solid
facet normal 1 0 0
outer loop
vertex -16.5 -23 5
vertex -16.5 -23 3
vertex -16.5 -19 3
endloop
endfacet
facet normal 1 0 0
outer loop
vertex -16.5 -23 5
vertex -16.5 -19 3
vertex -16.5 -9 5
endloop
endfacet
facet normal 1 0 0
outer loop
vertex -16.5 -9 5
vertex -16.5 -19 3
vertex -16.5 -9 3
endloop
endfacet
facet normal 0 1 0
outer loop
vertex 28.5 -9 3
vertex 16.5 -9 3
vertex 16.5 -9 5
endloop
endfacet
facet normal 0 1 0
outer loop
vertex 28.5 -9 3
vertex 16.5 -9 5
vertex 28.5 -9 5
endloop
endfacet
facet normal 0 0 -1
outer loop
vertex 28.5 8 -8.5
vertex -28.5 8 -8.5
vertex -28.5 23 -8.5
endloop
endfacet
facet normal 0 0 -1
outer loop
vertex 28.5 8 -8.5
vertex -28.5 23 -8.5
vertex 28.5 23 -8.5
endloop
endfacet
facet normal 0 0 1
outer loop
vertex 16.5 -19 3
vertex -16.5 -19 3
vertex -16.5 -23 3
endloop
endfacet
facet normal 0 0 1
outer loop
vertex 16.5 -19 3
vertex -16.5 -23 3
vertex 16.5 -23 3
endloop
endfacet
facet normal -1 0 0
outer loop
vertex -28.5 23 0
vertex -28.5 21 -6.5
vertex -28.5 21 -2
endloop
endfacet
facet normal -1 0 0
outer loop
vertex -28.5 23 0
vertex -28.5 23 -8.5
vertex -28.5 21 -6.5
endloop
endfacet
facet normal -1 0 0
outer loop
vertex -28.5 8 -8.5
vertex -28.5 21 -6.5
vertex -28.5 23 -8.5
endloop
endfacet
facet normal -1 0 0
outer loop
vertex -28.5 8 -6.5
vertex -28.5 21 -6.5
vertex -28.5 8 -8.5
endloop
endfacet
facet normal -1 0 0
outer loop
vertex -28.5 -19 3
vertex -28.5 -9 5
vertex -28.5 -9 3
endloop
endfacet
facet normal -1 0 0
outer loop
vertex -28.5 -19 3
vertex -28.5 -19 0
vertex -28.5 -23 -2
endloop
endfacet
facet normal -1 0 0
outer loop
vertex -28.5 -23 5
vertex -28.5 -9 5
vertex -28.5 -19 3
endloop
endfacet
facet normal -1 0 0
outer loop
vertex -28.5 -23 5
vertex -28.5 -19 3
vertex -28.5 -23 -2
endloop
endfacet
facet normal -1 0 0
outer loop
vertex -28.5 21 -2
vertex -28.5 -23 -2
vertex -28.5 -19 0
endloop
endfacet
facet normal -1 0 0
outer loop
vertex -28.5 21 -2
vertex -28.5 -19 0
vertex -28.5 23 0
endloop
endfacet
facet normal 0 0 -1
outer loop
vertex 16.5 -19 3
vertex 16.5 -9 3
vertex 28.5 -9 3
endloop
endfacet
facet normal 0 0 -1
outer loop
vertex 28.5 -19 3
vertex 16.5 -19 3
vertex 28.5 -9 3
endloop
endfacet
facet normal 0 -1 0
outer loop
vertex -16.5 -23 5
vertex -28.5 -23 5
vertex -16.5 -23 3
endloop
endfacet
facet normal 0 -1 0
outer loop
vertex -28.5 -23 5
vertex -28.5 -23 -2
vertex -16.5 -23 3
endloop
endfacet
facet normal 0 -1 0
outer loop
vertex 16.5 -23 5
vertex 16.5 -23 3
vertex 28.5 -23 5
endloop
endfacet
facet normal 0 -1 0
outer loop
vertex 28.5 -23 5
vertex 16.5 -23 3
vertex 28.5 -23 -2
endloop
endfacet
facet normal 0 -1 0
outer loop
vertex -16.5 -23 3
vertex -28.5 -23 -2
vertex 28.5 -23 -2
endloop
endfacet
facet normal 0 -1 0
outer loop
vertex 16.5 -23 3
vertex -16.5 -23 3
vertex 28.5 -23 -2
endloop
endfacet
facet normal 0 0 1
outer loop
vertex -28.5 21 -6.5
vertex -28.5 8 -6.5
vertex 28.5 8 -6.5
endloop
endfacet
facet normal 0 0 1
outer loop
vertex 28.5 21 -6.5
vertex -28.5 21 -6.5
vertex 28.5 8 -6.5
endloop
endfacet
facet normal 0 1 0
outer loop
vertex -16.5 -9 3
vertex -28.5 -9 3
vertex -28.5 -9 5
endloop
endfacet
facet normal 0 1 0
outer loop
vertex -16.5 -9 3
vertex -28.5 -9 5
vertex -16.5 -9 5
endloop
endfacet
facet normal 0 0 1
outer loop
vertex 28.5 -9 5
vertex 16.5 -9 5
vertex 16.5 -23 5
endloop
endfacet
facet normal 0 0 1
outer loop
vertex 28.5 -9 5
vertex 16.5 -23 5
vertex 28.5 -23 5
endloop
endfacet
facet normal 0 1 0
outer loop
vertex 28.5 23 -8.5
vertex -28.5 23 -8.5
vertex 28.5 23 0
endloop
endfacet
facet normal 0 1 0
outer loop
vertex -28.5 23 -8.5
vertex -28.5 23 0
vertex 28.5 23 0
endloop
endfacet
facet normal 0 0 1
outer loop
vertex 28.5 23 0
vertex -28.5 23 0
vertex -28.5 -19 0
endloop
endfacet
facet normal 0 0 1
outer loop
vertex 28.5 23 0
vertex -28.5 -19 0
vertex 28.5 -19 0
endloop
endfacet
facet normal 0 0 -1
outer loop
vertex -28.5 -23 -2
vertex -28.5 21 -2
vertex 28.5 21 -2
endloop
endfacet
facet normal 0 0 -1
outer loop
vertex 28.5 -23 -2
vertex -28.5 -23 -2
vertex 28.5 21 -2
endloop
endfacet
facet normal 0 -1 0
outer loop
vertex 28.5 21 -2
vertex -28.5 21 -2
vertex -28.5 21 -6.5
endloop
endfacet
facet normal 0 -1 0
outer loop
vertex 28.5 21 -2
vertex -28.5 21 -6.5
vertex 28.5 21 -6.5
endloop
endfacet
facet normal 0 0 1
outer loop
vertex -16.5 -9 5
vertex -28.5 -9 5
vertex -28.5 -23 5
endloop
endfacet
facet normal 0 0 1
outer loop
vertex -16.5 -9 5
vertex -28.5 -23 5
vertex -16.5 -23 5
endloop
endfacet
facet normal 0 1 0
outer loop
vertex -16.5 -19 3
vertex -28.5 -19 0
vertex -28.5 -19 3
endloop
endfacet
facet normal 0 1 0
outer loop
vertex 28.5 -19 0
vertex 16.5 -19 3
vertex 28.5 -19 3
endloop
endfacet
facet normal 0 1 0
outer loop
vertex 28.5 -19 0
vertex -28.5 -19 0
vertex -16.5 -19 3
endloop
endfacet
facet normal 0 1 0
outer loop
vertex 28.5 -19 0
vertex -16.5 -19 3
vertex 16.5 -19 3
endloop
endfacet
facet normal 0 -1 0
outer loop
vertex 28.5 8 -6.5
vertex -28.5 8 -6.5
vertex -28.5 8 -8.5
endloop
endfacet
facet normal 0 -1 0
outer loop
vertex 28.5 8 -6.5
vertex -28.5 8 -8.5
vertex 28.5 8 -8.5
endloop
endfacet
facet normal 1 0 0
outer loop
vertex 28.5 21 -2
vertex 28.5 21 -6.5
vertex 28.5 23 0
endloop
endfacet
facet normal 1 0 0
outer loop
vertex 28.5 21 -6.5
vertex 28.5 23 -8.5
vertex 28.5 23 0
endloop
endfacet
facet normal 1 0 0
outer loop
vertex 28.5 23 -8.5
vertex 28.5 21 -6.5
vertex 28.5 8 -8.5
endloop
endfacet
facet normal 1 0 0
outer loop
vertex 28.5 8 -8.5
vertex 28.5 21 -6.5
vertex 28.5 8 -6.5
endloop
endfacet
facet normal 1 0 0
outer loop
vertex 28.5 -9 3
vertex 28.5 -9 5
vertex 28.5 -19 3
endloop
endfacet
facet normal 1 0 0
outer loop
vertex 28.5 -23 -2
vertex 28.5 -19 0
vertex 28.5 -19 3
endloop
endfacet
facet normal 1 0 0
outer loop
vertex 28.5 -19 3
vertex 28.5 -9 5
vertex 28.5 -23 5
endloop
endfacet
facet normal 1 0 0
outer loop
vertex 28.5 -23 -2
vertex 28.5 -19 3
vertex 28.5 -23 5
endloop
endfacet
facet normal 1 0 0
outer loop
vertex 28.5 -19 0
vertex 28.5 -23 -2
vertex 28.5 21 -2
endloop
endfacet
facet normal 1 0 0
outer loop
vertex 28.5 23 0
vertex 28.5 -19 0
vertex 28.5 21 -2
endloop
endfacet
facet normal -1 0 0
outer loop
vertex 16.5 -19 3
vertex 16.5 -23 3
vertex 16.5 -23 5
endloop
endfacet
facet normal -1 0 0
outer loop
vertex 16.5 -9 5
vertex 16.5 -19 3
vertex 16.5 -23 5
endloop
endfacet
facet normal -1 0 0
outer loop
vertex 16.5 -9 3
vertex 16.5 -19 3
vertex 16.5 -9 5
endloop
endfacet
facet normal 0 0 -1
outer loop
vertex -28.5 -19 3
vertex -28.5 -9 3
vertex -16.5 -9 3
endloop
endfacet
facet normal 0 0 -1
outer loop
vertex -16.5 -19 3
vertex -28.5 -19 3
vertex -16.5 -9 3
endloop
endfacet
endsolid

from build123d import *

# Parameters (mm, degrees)
F0_W     = 57
F0_H     = 4
F0_H_2   = 2
F0_H_3   = 40
F1_DEPTH = 2
F2_DEPTH = 3
F3_W     = 12
F3_H     = 14
F4_DEPTH = 2
F5_DEPTH = 6.5
F6_W     = 57
F6_H     = 15
F7_DEPTH = 2


with BuildPart() as f1:
    # F0 (on Top) → F1 (new body)
    with BuildSketch(Plane.XY):
        with Locations((0, -21)):
            Rectangle(F0_W, F0_H)
        with Locations((0, 22)):
            Rectangle(F0_W, F0_H_2)
        with Locations((0, 1)):
            Rectangle(F0_W, F0_H_3)
    extrude(amount=-F1_DEPTH)

    # F0 (on Top) → F2 (join)
    with BuildSketch(Plane.XY):
        with Locations((0, -21)):
            Rectangle(F0_W, F0_H)
    extrude(amount=F2_DEPTH)

    # F3 (on face) → F4 (join)
    with BuildSketch(Plane.XY.offset(3)):
        with Locations((-22.5, -16)):
            Rectangle(F3_W, F3_H)
        with Locations((22.5, -16)):
            Rectangle(F3_W, F3_H)
    extrude(amount=F4_DEPTH)

    # F0 (on Top) → F5 (join)
    with BuildSketch(Plane.XY):
        with Locations((0, 22)):
            Rectangle(F0_W, F0_H_2)
    extrude(amount=-F5_DEPTH)

    # F6 (on face) → F7 (join)
    with BuildSketch(Plane(origin=(0, 0, -6.5), x_dir=(1, 0, 0), z_dir=(0, 0, -1))):
        with Locations((0, -15.5)):
            Rectangle(F6_W, F6_H)
    extrude(amount=F7_DEPTH)


solid = f1.part
